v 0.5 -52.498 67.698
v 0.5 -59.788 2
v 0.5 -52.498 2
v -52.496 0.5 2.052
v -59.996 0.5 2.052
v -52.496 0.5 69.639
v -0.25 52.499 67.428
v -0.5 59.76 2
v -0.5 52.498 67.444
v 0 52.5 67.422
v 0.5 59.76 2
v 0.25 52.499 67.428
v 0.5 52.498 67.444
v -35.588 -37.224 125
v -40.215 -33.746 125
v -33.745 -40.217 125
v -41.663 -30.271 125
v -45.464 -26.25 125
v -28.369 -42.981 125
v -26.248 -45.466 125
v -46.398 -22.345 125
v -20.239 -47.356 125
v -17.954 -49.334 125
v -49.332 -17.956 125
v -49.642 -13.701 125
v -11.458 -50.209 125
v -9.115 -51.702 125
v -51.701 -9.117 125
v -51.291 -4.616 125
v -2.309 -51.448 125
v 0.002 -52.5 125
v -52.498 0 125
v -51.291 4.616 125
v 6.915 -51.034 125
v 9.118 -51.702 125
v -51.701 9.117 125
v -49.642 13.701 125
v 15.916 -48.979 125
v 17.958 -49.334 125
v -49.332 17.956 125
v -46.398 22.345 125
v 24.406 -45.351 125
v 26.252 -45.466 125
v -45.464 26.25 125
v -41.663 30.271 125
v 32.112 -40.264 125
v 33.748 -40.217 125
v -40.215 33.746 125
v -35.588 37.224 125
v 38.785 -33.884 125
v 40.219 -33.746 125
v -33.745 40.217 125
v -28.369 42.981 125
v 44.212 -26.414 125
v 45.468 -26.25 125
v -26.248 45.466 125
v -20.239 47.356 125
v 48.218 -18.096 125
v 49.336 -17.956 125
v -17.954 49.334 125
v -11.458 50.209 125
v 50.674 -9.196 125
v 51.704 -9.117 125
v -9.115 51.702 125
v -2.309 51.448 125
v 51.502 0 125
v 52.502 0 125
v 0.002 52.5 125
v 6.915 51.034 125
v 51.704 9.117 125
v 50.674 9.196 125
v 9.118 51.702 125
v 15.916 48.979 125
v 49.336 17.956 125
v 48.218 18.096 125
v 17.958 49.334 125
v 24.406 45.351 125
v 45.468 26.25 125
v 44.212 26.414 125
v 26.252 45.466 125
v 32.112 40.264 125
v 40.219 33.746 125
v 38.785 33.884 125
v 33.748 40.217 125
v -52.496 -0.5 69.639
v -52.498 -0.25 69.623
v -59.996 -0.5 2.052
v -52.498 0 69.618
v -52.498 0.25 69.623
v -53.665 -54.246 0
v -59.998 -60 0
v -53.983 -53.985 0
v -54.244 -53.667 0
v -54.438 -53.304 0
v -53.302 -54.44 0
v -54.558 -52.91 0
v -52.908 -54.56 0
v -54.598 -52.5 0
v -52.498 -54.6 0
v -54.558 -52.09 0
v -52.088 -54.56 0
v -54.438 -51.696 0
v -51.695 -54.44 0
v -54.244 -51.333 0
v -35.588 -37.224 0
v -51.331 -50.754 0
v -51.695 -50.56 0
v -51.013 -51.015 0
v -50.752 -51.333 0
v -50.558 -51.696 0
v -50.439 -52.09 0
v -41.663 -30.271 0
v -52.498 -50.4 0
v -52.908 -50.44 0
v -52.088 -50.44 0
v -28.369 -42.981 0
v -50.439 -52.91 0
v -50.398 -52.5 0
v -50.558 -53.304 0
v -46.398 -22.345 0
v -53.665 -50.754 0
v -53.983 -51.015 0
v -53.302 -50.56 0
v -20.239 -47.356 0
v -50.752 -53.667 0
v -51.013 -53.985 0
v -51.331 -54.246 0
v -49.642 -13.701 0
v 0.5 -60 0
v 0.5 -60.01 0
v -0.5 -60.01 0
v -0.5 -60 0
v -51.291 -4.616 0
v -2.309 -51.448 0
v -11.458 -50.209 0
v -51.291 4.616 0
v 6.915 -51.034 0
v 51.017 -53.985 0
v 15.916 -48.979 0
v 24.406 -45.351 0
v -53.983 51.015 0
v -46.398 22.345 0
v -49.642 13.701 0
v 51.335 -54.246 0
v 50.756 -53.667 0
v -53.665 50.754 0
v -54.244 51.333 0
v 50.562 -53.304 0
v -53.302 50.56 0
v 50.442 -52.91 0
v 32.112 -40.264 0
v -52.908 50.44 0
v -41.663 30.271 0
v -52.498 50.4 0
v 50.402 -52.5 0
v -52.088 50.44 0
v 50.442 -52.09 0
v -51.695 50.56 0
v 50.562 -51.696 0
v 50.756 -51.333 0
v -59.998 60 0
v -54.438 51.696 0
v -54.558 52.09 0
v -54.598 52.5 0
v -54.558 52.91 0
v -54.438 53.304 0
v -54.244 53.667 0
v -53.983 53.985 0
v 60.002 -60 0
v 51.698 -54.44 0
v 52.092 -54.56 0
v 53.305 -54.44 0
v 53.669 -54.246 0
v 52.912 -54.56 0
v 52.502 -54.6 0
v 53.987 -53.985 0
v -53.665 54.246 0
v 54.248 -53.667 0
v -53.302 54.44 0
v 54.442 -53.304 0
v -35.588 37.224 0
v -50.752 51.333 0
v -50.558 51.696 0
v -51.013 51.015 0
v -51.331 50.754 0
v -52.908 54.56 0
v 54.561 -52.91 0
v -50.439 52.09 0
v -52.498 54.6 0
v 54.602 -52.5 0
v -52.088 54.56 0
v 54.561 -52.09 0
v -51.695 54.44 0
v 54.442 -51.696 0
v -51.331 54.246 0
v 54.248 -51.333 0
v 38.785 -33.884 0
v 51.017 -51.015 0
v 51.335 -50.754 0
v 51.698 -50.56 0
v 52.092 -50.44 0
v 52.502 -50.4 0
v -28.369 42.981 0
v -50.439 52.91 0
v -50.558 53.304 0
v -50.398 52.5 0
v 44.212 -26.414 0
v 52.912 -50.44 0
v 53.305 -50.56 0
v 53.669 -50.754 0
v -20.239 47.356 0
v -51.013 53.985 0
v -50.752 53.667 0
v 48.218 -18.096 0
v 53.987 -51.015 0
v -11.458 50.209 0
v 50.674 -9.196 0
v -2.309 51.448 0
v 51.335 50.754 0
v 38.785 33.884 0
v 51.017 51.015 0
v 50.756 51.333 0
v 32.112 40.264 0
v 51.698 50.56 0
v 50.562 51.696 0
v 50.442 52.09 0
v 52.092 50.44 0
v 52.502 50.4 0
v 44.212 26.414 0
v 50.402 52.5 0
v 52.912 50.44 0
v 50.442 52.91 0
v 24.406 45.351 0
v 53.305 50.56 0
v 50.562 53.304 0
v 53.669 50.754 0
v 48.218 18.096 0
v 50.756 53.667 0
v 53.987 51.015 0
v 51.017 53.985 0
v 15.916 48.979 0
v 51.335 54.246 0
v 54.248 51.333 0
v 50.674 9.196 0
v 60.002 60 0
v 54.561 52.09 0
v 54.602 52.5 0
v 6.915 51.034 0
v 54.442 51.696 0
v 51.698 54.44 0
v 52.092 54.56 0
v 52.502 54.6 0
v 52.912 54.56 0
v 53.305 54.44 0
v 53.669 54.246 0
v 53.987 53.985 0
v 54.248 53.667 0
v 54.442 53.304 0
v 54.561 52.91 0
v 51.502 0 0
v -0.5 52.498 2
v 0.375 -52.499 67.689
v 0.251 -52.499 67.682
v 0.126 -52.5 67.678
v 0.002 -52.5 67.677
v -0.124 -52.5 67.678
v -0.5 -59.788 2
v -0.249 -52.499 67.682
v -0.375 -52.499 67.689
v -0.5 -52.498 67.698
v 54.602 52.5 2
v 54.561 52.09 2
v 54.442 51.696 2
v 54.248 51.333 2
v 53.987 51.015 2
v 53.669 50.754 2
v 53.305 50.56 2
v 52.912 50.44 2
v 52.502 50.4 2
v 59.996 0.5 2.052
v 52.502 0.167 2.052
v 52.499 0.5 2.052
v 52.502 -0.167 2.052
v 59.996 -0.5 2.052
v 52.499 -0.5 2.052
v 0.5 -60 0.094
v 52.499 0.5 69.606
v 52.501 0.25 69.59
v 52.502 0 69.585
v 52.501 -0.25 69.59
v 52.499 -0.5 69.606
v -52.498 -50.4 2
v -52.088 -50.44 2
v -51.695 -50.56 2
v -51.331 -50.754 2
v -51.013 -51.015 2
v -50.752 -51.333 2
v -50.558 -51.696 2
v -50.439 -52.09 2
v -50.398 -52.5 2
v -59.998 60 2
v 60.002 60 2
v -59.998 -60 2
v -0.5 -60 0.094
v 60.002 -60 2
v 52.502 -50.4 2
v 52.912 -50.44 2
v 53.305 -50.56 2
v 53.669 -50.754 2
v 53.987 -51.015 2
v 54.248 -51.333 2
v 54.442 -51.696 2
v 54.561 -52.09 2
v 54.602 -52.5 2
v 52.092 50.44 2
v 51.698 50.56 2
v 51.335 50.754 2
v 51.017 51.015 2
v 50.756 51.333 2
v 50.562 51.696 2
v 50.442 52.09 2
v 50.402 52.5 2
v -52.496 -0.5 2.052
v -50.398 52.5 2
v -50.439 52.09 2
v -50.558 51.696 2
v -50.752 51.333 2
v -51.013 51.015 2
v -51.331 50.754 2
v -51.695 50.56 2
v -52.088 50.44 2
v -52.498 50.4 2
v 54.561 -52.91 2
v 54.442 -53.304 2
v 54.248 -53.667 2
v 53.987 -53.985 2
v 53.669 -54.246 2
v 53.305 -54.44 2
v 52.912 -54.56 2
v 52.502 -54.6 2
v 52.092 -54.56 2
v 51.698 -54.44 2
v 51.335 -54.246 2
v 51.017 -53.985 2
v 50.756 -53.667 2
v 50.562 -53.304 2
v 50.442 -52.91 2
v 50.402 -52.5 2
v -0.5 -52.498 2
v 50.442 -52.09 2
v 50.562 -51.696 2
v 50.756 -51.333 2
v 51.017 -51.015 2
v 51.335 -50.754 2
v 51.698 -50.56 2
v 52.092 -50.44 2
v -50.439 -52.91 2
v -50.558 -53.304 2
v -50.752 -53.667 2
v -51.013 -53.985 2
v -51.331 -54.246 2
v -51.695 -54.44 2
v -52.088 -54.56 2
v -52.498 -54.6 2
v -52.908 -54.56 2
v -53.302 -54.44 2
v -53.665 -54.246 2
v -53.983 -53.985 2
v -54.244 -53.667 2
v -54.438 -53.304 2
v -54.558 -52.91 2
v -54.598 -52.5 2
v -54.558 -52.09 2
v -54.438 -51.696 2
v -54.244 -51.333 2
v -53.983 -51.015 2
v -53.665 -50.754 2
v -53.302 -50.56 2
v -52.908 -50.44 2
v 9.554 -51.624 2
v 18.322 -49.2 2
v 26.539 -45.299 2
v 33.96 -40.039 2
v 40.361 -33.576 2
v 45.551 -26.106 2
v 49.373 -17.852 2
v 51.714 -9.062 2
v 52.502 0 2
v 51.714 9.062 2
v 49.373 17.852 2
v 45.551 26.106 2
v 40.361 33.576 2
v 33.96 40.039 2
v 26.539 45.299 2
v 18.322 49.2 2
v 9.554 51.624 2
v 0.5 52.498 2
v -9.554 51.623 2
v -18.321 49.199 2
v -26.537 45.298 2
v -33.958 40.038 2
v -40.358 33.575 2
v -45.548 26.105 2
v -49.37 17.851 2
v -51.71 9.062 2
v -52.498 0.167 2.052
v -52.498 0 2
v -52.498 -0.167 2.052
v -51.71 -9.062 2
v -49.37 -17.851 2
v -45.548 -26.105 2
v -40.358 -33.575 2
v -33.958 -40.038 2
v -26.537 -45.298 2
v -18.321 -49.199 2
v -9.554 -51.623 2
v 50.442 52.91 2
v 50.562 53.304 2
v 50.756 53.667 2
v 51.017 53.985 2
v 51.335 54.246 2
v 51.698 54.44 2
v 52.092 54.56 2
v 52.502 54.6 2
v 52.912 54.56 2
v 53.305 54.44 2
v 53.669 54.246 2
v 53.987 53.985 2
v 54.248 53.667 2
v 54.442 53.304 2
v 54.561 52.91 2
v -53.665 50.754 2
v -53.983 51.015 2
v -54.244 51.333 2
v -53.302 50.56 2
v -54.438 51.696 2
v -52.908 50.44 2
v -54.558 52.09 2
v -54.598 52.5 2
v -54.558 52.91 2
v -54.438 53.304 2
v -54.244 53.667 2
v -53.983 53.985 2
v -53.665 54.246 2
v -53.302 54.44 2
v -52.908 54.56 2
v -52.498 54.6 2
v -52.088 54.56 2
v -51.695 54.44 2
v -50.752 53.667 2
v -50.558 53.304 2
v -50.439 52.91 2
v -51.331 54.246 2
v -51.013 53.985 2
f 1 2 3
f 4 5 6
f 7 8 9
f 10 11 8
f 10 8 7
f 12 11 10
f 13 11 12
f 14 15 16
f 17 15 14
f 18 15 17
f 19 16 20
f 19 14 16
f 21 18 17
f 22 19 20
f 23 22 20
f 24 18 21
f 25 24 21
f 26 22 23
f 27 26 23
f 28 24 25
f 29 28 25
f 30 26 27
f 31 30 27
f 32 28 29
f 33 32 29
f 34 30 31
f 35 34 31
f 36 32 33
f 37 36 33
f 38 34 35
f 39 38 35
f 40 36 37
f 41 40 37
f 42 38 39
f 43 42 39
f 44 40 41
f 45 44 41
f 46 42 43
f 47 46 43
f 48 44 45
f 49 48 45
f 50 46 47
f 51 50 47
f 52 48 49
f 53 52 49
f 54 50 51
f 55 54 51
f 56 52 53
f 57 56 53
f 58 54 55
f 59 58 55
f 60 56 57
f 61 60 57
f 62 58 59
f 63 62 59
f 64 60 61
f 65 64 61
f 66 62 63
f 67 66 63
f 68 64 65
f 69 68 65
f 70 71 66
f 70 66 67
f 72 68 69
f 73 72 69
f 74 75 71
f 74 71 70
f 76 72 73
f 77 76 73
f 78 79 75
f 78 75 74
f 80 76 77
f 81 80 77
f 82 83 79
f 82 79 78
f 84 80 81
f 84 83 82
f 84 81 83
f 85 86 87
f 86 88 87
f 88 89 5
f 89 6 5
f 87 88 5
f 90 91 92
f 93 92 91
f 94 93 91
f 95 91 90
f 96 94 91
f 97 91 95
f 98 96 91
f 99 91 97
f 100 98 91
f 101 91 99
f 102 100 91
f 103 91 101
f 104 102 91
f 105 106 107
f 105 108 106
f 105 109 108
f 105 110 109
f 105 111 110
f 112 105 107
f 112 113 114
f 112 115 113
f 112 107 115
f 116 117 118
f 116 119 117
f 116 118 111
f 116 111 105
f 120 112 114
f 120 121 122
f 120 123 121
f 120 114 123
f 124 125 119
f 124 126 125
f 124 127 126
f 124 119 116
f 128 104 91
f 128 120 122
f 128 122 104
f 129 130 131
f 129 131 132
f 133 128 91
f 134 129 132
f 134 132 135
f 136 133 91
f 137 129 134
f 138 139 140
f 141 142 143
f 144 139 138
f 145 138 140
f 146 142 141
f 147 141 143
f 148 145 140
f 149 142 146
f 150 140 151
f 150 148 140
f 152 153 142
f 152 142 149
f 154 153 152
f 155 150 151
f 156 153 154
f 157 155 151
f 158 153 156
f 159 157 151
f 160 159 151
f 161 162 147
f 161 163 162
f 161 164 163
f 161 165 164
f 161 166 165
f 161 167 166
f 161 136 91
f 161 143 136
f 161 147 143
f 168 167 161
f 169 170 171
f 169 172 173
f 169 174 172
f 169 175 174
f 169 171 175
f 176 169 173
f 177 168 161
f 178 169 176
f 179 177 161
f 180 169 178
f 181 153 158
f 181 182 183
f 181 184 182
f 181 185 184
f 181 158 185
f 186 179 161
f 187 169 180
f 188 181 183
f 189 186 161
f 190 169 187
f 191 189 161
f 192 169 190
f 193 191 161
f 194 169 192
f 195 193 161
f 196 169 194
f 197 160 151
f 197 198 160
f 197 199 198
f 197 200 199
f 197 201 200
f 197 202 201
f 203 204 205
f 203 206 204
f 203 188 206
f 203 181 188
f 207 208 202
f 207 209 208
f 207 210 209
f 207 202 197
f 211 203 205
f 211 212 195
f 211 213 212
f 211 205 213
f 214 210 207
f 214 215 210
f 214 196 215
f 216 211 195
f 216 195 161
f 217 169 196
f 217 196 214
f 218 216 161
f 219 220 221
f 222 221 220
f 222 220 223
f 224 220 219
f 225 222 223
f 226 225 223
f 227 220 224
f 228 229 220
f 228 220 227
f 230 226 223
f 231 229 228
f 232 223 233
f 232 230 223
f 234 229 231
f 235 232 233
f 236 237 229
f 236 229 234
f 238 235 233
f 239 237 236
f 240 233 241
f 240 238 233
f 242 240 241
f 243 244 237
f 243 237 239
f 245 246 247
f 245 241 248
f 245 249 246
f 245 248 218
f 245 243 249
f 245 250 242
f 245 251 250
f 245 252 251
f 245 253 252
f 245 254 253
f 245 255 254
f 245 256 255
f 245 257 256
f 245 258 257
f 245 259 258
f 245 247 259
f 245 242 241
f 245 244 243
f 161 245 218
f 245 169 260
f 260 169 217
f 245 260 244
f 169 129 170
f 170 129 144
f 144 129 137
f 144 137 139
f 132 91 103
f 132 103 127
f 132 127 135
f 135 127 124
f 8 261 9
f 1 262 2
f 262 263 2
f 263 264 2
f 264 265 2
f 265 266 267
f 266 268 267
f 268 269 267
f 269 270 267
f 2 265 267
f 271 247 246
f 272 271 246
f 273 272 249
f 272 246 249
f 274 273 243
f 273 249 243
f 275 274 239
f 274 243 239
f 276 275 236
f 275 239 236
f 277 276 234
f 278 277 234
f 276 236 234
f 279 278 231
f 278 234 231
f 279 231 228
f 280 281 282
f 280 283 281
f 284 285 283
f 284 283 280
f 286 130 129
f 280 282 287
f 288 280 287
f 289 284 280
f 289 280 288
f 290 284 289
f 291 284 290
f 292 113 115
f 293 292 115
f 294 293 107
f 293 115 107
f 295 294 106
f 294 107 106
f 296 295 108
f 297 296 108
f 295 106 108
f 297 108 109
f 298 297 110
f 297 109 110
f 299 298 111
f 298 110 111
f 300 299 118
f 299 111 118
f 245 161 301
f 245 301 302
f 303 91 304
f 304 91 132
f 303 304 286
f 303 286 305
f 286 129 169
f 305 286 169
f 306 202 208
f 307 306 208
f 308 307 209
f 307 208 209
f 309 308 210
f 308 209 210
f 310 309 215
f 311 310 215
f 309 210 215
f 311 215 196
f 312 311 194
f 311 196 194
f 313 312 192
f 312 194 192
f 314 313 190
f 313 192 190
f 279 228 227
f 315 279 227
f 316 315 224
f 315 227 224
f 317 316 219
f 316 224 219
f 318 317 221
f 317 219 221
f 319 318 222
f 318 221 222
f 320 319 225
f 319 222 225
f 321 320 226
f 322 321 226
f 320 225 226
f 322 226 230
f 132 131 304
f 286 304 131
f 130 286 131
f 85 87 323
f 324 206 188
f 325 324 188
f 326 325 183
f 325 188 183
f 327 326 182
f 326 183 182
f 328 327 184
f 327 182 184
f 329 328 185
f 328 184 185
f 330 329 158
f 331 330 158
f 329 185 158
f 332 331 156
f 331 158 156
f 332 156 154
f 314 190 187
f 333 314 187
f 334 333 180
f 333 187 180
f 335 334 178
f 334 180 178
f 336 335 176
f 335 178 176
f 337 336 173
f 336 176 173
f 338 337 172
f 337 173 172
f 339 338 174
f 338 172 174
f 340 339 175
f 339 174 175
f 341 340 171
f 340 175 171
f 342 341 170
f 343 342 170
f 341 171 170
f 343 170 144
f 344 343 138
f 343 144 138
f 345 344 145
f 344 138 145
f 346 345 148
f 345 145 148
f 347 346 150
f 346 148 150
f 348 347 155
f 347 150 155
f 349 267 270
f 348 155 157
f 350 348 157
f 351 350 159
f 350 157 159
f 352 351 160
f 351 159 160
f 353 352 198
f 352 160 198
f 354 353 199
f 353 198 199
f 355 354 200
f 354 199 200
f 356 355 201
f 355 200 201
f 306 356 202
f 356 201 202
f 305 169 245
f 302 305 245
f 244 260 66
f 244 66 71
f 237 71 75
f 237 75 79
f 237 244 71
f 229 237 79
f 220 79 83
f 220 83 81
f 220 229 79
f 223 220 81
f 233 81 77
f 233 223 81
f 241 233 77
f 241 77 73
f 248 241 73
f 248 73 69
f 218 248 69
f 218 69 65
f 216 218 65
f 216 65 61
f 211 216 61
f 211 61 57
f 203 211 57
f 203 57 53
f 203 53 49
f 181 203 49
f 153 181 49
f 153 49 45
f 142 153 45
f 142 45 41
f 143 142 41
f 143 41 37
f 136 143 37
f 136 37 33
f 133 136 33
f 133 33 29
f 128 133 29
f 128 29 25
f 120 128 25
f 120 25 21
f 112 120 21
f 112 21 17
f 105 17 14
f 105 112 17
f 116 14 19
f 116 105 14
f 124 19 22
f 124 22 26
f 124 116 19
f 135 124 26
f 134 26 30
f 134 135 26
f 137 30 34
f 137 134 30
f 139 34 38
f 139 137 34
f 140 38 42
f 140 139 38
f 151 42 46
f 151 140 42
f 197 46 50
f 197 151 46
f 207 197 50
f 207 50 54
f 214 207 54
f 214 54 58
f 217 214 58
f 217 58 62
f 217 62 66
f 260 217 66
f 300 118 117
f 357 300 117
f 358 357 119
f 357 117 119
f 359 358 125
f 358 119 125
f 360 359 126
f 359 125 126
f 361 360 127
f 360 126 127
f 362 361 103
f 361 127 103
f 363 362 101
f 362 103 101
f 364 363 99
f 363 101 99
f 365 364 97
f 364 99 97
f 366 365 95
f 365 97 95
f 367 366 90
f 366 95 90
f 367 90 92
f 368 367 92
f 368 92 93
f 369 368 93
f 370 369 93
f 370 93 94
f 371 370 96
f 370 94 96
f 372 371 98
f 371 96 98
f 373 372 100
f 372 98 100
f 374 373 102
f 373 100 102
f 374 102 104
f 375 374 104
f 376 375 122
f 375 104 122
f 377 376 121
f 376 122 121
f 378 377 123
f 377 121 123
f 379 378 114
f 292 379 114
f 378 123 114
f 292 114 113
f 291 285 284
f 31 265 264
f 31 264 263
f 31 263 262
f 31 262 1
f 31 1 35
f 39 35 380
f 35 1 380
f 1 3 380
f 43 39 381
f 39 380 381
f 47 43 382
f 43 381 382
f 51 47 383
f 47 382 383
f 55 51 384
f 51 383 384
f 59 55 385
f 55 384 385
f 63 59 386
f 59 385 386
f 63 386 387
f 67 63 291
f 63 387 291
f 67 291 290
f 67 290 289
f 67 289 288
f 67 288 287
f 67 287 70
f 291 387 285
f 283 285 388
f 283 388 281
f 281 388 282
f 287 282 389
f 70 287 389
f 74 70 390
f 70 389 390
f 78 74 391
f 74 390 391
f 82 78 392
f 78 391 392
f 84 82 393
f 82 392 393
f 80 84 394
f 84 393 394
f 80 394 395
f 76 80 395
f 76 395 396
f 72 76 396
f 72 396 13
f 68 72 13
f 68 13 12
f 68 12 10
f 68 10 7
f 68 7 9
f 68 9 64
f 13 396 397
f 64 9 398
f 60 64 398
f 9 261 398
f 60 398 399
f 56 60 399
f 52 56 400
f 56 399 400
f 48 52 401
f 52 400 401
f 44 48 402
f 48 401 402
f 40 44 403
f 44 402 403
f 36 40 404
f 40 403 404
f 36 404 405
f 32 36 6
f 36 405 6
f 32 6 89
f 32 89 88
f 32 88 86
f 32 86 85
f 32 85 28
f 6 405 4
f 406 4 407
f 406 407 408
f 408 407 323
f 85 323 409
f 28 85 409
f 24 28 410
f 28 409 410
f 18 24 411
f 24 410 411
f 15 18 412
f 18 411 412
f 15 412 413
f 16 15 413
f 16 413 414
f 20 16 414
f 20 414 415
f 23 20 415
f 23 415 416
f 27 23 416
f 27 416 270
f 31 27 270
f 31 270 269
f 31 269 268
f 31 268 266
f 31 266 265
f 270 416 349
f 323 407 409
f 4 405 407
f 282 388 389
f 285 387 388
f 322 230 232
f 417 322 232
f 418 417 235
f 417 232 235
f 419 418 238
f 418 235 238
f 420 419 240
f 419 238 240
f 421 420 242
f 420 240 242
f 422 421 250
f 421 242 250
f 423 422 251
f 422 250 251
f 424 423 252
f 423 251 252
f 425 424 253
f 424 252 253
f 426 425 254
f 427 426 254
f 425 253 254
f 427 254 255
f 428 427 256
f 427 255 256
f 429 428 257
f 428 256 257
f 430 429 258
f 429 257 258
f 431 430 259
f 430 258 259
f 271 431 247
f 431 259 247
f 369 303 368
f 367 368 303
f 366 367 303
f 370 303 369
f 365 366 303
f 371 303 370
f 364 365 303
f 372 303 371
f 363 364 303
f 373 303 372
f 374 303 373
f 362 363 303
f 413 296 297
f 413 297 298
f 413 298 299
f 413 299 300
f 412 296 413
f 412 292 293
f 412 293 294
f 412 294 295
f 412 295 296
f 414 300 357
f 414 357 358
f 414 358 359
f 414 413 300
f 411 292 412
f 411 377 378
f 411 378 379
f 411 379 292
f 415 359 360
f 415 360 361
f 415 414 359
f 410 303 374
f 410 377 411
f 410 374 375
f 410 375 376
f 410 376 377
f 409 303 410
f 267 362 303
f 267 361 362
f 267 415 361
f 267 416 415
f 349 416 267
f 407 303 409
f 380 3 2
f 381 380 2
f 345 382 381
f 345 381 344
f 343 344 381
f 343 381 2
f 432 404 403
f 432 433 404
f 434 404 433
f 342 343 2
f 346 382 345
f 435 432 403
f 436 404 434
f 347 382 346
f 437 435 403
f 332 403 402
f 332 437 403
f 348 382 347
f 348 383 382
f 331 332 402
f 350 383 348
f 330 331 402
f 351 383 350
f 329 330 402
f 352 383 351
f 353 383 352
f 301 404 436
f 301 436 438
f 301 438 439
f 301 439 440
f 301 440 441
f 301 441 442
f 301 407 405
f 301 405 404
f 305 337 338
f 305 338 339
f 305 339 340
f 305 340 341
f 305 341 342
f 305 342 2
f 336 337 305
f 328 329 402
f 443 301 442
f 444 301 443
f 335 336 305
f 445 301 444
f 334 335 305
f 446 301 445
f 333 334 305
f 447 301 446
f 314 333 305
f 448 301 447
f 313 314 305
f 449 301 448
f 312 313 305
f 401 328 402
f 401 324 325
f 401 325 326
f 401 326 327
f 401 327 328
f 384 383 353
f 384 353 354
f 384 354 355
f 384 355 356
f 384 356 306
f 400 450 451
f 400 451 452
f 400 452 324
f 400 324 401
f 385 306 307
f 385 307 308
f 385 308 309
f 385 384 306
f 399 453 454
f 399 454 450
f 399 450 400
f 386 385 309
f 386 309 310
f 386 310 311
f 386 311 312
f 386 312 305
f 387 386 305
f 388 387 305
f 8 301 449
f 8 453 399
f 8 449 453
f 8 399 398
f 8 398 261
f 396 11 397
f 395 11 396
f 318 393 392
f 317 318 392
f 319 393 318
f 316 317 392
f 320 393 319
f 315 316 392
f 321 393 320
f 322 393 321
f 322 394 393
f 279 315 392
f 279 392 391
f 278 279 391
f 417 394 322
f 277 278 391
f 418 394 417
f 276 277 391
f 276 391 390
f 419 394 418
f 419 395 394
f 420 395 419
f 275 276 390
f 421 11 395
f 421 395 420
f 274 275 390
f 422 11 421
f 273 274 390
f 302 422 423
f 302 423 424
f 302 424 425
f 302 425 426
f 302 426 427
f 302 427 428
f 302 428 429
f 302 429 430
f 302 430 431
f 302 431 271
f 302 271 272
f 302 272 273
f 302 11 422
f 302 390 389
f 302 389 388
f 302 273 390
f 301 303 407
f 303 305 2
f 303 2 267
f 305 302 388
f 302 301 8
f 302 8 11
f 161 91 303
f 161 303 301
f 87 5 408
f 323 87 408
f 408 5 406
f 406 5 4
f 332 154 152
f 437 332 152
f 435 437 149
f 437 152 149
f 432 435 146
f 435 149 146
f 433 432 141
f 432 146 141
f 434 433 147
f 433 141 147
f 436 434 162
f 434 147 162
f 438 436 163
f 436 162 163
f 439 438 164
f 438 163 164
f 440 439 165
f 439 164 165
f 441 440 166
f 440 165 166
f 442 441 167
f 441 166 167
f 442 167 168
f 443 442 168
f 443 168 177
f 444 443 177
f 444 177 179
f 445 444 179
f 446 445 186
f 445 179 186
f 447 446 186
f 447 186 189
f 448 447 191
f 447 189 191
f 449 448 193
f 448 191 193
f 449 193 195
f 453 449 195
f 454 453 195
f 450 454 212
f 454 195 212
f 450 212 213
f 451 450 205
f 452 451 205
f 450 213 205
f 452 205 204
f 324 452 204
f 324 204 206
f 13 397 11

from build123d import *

# Parameters (mm, degrees)
F0_W     = 120
F0_H     = 120
F0_R     = 51.5
F1_DEPTH = 2
F2_DEPTH = 125
F5_DEPTH = 0.5
F6_DEPTH = 0.5


with BuildPart() as f1:
    # F0 (on Top) → F1 (new body)
    with BuildSketch(Plane.XY):
        with Locations((0.0018474467, 3.25e-08)):
            Rectangle(F0_W, F0_H)
        with BuildLine():
            ThreePointArc((-52.4981525533, 50.4000000325), (-53.9830767937, 53.984924273), (-50.3981525533, 52.5000000325))
            Line((-50.3981525533, 52.5000000325), (0.0018477668, 52.5000000325))
            Line((0.0018477668, 52.5000000325), (50.4018474467, 52.5000000325))
            ThreePointArc((50.4018474467, 52.5000000325), (52.5018474467, 54.6000000325), (54.6018474467, 52.5000000325))
            ThreePointArc((54.6018474467, 52.5000000325), (53.9867716872, 51.015075792), (52.5018474467, 50.4000000325))
            Line((52.5018474467, 50.4000000325), (52.5018474467, 0))
            Line((52.5018474467, 0), (52.5018474467, -50.3999999675))
            ThreePointArc((52.5018474467, -50.3999999675), (53.9867716872, -51.015075727), (54.6018474467, -52.4999999675))
            ThreePointArc((54.6018474467, -52.4999999675), (52.5018474467, -54.5999999675), (50.4018474467, -52.4999999675))
            Line((50.4018474467, -52.4999999675), (0.0018474467, -52.4999999675))
            Line((0.0018474467, -52.4999999675), (-50.3981525533, -52.4999999675))
            ThreePointArc((-50.3981525533, -52.4999999675), (-53.9830767937, -53.984924208), (-52.4981525533, -50.3999999675))
            Line((-52.4981525533, -50.3999999675), (-52.4981525533, -3.4e-09))
            Line((-52.4981525533, -3.4e-09), (-52.4981525533, 50.4000000325))
        make_face(mode=Mode.SUBTRACT)
        with BuildLine():
            Line((0.0018477668, 52.5000000325), (-50.3981525533, 52.5000000325))
            ThreePointArc((-50.3981525533, 52.5000000325), (-51.0132283128, 51.015075792), (-52.4981525533, 50.4000000325))
            Line((-52.4981525533, 50.4000000325), (-52.4981525533, -3.4e-09))
            ThreePointArc((-52.4981525533, -3.4e-09), (-37.1212584536, 37.1231061243), (0.0018477668, 52.5))
        make_face()
        with BuildLine():
            Line((50.4018474467, 52.5000000325), (0.0018477668, 52.5000000325))
            ThreePointArc((0.0018477668, 52.5), (37.1249535722, 37.1231058991), (52.5018474467, 0))
            Line((52.5018474467, 0), (52.5018474467, 50.4000000325))
            ThreePointArc((52.5018474467, 50.4000000325), (51.0169232063, 51.015075792), (50.4018474467, 52.5000000325))
        make_face()
        with BuildLine():
            Line((52.5018474467, -50.3999999675), (52.5018474467, 0))
            ThreePointArc((52.5018474467, 0), (37.124953459, -37.1231060123), (0.0018474467, -52.5))
            Line((0.0018474467, -52.4999999675), (50.4018474467, -52.4999999675))
            ThreePointArc((50.4018474467, -52.4999999675), (51.0169232063, -51.015075727), (52.5018474467, -50.3999999675))
        make_face()
        with BuildLine():
            ThreePointArc((0.0018474467, -52.5), (-37.1212585644, -37.1231060135), (-52.4981525533, -3.4e-09))
            Line((-52.4981525533, -3.4e-09), (-52.4981525533, -50.3999999675))
            ThreePointArc((-52.4981525533, -50.3999999675), (-51.0132283128, -51.015075727), (-50.3981525533, -52.4999999675))
            Line((-50.3981525533, -52.4999999675), (0.0018474467, -52.4999999675))
        make_face()
        with BuildLine():
            ThreePointArc((52.5018474467, 0), (37.1249535722, 37.1231058991), (0.0018477668, 52.5))
            ThreePointArc((0.0018477668, 52.5), (-37.1212584536, 37.1231061243), (-52.4981525533, -3.4e-09))
            ThreePointArc((-52.4981525533, -3.4e-09), (-37.1212585644, -37.1231060135), (0.0018474467, -52.5))
            ThreePointArc((0.0018474467, -52.5), (37.124953459, -37.1231060123), (52.5018474467, 0))
        make_face()
        with Locations((0.0018474467, 0)):
            Circle(F0_R, mode=Mode.SUBTRACT)
    extrude(amount=F1_DEPTH)

    # F0 (on Top) → F2 (join)
    with BuildSketch(Plane.XY):
        with BuildLine():
            ThreePointArc((52.5018474467, 0), (37.1249535722, 37.1231058991), (0.0018477668, 52.5))
            ThreePointArc((0.0018477668, 52.5), (-37.1212584536, 37.1231061243), (-52.4981525533, -3.4e-09))
            ThreePointArc((-52.4981525533, -3.4e-09), (-37.1212585644, -37.1231060135), (0.0018474467, -52.5))
            ThreePointArc((0.0018474467, -52.5), (37.124953459, -37.1231060123), (52.5018474467, 0))
        make_face()
        with Locations((0.0018474467, 0)):
            Circle(F0_R, mode=Mode.SUBTRACT)
    extrude(amount=F2_DEPTH)

    # F3 (on Front) → F5 (join, symmetric)
    with BuildSketch(Plane.XZ):
        Polygon((-52.1482676268, 72.7708116174), (-59.9962957203, 2.0518270321), (-52.1482676268, 2.0518270321), align=None)
        Polygon((52.1482676268, 2.0518270321), (59.9962957203, 2.0518270321), (52.1482676268, 72.7708116174), align=None)
    extrude(amount=F5_DEPTH, both=True)

    # F4 (on Right) → F6 (join, symmetric)
    with BuildSketch(Plane.YZ):
        Polygon((-52.1623715758, 70.7189845853), (-60.0103996694, 0), (-52.1623715758, 0), align=None)
        Polygon((52.1341636777, 0), (59.9821917713, 0), (52.1341636777, 70.7189845853), align=None)
    extrude(amount=F6_DEPTH, both=True)


solid = f1.part
